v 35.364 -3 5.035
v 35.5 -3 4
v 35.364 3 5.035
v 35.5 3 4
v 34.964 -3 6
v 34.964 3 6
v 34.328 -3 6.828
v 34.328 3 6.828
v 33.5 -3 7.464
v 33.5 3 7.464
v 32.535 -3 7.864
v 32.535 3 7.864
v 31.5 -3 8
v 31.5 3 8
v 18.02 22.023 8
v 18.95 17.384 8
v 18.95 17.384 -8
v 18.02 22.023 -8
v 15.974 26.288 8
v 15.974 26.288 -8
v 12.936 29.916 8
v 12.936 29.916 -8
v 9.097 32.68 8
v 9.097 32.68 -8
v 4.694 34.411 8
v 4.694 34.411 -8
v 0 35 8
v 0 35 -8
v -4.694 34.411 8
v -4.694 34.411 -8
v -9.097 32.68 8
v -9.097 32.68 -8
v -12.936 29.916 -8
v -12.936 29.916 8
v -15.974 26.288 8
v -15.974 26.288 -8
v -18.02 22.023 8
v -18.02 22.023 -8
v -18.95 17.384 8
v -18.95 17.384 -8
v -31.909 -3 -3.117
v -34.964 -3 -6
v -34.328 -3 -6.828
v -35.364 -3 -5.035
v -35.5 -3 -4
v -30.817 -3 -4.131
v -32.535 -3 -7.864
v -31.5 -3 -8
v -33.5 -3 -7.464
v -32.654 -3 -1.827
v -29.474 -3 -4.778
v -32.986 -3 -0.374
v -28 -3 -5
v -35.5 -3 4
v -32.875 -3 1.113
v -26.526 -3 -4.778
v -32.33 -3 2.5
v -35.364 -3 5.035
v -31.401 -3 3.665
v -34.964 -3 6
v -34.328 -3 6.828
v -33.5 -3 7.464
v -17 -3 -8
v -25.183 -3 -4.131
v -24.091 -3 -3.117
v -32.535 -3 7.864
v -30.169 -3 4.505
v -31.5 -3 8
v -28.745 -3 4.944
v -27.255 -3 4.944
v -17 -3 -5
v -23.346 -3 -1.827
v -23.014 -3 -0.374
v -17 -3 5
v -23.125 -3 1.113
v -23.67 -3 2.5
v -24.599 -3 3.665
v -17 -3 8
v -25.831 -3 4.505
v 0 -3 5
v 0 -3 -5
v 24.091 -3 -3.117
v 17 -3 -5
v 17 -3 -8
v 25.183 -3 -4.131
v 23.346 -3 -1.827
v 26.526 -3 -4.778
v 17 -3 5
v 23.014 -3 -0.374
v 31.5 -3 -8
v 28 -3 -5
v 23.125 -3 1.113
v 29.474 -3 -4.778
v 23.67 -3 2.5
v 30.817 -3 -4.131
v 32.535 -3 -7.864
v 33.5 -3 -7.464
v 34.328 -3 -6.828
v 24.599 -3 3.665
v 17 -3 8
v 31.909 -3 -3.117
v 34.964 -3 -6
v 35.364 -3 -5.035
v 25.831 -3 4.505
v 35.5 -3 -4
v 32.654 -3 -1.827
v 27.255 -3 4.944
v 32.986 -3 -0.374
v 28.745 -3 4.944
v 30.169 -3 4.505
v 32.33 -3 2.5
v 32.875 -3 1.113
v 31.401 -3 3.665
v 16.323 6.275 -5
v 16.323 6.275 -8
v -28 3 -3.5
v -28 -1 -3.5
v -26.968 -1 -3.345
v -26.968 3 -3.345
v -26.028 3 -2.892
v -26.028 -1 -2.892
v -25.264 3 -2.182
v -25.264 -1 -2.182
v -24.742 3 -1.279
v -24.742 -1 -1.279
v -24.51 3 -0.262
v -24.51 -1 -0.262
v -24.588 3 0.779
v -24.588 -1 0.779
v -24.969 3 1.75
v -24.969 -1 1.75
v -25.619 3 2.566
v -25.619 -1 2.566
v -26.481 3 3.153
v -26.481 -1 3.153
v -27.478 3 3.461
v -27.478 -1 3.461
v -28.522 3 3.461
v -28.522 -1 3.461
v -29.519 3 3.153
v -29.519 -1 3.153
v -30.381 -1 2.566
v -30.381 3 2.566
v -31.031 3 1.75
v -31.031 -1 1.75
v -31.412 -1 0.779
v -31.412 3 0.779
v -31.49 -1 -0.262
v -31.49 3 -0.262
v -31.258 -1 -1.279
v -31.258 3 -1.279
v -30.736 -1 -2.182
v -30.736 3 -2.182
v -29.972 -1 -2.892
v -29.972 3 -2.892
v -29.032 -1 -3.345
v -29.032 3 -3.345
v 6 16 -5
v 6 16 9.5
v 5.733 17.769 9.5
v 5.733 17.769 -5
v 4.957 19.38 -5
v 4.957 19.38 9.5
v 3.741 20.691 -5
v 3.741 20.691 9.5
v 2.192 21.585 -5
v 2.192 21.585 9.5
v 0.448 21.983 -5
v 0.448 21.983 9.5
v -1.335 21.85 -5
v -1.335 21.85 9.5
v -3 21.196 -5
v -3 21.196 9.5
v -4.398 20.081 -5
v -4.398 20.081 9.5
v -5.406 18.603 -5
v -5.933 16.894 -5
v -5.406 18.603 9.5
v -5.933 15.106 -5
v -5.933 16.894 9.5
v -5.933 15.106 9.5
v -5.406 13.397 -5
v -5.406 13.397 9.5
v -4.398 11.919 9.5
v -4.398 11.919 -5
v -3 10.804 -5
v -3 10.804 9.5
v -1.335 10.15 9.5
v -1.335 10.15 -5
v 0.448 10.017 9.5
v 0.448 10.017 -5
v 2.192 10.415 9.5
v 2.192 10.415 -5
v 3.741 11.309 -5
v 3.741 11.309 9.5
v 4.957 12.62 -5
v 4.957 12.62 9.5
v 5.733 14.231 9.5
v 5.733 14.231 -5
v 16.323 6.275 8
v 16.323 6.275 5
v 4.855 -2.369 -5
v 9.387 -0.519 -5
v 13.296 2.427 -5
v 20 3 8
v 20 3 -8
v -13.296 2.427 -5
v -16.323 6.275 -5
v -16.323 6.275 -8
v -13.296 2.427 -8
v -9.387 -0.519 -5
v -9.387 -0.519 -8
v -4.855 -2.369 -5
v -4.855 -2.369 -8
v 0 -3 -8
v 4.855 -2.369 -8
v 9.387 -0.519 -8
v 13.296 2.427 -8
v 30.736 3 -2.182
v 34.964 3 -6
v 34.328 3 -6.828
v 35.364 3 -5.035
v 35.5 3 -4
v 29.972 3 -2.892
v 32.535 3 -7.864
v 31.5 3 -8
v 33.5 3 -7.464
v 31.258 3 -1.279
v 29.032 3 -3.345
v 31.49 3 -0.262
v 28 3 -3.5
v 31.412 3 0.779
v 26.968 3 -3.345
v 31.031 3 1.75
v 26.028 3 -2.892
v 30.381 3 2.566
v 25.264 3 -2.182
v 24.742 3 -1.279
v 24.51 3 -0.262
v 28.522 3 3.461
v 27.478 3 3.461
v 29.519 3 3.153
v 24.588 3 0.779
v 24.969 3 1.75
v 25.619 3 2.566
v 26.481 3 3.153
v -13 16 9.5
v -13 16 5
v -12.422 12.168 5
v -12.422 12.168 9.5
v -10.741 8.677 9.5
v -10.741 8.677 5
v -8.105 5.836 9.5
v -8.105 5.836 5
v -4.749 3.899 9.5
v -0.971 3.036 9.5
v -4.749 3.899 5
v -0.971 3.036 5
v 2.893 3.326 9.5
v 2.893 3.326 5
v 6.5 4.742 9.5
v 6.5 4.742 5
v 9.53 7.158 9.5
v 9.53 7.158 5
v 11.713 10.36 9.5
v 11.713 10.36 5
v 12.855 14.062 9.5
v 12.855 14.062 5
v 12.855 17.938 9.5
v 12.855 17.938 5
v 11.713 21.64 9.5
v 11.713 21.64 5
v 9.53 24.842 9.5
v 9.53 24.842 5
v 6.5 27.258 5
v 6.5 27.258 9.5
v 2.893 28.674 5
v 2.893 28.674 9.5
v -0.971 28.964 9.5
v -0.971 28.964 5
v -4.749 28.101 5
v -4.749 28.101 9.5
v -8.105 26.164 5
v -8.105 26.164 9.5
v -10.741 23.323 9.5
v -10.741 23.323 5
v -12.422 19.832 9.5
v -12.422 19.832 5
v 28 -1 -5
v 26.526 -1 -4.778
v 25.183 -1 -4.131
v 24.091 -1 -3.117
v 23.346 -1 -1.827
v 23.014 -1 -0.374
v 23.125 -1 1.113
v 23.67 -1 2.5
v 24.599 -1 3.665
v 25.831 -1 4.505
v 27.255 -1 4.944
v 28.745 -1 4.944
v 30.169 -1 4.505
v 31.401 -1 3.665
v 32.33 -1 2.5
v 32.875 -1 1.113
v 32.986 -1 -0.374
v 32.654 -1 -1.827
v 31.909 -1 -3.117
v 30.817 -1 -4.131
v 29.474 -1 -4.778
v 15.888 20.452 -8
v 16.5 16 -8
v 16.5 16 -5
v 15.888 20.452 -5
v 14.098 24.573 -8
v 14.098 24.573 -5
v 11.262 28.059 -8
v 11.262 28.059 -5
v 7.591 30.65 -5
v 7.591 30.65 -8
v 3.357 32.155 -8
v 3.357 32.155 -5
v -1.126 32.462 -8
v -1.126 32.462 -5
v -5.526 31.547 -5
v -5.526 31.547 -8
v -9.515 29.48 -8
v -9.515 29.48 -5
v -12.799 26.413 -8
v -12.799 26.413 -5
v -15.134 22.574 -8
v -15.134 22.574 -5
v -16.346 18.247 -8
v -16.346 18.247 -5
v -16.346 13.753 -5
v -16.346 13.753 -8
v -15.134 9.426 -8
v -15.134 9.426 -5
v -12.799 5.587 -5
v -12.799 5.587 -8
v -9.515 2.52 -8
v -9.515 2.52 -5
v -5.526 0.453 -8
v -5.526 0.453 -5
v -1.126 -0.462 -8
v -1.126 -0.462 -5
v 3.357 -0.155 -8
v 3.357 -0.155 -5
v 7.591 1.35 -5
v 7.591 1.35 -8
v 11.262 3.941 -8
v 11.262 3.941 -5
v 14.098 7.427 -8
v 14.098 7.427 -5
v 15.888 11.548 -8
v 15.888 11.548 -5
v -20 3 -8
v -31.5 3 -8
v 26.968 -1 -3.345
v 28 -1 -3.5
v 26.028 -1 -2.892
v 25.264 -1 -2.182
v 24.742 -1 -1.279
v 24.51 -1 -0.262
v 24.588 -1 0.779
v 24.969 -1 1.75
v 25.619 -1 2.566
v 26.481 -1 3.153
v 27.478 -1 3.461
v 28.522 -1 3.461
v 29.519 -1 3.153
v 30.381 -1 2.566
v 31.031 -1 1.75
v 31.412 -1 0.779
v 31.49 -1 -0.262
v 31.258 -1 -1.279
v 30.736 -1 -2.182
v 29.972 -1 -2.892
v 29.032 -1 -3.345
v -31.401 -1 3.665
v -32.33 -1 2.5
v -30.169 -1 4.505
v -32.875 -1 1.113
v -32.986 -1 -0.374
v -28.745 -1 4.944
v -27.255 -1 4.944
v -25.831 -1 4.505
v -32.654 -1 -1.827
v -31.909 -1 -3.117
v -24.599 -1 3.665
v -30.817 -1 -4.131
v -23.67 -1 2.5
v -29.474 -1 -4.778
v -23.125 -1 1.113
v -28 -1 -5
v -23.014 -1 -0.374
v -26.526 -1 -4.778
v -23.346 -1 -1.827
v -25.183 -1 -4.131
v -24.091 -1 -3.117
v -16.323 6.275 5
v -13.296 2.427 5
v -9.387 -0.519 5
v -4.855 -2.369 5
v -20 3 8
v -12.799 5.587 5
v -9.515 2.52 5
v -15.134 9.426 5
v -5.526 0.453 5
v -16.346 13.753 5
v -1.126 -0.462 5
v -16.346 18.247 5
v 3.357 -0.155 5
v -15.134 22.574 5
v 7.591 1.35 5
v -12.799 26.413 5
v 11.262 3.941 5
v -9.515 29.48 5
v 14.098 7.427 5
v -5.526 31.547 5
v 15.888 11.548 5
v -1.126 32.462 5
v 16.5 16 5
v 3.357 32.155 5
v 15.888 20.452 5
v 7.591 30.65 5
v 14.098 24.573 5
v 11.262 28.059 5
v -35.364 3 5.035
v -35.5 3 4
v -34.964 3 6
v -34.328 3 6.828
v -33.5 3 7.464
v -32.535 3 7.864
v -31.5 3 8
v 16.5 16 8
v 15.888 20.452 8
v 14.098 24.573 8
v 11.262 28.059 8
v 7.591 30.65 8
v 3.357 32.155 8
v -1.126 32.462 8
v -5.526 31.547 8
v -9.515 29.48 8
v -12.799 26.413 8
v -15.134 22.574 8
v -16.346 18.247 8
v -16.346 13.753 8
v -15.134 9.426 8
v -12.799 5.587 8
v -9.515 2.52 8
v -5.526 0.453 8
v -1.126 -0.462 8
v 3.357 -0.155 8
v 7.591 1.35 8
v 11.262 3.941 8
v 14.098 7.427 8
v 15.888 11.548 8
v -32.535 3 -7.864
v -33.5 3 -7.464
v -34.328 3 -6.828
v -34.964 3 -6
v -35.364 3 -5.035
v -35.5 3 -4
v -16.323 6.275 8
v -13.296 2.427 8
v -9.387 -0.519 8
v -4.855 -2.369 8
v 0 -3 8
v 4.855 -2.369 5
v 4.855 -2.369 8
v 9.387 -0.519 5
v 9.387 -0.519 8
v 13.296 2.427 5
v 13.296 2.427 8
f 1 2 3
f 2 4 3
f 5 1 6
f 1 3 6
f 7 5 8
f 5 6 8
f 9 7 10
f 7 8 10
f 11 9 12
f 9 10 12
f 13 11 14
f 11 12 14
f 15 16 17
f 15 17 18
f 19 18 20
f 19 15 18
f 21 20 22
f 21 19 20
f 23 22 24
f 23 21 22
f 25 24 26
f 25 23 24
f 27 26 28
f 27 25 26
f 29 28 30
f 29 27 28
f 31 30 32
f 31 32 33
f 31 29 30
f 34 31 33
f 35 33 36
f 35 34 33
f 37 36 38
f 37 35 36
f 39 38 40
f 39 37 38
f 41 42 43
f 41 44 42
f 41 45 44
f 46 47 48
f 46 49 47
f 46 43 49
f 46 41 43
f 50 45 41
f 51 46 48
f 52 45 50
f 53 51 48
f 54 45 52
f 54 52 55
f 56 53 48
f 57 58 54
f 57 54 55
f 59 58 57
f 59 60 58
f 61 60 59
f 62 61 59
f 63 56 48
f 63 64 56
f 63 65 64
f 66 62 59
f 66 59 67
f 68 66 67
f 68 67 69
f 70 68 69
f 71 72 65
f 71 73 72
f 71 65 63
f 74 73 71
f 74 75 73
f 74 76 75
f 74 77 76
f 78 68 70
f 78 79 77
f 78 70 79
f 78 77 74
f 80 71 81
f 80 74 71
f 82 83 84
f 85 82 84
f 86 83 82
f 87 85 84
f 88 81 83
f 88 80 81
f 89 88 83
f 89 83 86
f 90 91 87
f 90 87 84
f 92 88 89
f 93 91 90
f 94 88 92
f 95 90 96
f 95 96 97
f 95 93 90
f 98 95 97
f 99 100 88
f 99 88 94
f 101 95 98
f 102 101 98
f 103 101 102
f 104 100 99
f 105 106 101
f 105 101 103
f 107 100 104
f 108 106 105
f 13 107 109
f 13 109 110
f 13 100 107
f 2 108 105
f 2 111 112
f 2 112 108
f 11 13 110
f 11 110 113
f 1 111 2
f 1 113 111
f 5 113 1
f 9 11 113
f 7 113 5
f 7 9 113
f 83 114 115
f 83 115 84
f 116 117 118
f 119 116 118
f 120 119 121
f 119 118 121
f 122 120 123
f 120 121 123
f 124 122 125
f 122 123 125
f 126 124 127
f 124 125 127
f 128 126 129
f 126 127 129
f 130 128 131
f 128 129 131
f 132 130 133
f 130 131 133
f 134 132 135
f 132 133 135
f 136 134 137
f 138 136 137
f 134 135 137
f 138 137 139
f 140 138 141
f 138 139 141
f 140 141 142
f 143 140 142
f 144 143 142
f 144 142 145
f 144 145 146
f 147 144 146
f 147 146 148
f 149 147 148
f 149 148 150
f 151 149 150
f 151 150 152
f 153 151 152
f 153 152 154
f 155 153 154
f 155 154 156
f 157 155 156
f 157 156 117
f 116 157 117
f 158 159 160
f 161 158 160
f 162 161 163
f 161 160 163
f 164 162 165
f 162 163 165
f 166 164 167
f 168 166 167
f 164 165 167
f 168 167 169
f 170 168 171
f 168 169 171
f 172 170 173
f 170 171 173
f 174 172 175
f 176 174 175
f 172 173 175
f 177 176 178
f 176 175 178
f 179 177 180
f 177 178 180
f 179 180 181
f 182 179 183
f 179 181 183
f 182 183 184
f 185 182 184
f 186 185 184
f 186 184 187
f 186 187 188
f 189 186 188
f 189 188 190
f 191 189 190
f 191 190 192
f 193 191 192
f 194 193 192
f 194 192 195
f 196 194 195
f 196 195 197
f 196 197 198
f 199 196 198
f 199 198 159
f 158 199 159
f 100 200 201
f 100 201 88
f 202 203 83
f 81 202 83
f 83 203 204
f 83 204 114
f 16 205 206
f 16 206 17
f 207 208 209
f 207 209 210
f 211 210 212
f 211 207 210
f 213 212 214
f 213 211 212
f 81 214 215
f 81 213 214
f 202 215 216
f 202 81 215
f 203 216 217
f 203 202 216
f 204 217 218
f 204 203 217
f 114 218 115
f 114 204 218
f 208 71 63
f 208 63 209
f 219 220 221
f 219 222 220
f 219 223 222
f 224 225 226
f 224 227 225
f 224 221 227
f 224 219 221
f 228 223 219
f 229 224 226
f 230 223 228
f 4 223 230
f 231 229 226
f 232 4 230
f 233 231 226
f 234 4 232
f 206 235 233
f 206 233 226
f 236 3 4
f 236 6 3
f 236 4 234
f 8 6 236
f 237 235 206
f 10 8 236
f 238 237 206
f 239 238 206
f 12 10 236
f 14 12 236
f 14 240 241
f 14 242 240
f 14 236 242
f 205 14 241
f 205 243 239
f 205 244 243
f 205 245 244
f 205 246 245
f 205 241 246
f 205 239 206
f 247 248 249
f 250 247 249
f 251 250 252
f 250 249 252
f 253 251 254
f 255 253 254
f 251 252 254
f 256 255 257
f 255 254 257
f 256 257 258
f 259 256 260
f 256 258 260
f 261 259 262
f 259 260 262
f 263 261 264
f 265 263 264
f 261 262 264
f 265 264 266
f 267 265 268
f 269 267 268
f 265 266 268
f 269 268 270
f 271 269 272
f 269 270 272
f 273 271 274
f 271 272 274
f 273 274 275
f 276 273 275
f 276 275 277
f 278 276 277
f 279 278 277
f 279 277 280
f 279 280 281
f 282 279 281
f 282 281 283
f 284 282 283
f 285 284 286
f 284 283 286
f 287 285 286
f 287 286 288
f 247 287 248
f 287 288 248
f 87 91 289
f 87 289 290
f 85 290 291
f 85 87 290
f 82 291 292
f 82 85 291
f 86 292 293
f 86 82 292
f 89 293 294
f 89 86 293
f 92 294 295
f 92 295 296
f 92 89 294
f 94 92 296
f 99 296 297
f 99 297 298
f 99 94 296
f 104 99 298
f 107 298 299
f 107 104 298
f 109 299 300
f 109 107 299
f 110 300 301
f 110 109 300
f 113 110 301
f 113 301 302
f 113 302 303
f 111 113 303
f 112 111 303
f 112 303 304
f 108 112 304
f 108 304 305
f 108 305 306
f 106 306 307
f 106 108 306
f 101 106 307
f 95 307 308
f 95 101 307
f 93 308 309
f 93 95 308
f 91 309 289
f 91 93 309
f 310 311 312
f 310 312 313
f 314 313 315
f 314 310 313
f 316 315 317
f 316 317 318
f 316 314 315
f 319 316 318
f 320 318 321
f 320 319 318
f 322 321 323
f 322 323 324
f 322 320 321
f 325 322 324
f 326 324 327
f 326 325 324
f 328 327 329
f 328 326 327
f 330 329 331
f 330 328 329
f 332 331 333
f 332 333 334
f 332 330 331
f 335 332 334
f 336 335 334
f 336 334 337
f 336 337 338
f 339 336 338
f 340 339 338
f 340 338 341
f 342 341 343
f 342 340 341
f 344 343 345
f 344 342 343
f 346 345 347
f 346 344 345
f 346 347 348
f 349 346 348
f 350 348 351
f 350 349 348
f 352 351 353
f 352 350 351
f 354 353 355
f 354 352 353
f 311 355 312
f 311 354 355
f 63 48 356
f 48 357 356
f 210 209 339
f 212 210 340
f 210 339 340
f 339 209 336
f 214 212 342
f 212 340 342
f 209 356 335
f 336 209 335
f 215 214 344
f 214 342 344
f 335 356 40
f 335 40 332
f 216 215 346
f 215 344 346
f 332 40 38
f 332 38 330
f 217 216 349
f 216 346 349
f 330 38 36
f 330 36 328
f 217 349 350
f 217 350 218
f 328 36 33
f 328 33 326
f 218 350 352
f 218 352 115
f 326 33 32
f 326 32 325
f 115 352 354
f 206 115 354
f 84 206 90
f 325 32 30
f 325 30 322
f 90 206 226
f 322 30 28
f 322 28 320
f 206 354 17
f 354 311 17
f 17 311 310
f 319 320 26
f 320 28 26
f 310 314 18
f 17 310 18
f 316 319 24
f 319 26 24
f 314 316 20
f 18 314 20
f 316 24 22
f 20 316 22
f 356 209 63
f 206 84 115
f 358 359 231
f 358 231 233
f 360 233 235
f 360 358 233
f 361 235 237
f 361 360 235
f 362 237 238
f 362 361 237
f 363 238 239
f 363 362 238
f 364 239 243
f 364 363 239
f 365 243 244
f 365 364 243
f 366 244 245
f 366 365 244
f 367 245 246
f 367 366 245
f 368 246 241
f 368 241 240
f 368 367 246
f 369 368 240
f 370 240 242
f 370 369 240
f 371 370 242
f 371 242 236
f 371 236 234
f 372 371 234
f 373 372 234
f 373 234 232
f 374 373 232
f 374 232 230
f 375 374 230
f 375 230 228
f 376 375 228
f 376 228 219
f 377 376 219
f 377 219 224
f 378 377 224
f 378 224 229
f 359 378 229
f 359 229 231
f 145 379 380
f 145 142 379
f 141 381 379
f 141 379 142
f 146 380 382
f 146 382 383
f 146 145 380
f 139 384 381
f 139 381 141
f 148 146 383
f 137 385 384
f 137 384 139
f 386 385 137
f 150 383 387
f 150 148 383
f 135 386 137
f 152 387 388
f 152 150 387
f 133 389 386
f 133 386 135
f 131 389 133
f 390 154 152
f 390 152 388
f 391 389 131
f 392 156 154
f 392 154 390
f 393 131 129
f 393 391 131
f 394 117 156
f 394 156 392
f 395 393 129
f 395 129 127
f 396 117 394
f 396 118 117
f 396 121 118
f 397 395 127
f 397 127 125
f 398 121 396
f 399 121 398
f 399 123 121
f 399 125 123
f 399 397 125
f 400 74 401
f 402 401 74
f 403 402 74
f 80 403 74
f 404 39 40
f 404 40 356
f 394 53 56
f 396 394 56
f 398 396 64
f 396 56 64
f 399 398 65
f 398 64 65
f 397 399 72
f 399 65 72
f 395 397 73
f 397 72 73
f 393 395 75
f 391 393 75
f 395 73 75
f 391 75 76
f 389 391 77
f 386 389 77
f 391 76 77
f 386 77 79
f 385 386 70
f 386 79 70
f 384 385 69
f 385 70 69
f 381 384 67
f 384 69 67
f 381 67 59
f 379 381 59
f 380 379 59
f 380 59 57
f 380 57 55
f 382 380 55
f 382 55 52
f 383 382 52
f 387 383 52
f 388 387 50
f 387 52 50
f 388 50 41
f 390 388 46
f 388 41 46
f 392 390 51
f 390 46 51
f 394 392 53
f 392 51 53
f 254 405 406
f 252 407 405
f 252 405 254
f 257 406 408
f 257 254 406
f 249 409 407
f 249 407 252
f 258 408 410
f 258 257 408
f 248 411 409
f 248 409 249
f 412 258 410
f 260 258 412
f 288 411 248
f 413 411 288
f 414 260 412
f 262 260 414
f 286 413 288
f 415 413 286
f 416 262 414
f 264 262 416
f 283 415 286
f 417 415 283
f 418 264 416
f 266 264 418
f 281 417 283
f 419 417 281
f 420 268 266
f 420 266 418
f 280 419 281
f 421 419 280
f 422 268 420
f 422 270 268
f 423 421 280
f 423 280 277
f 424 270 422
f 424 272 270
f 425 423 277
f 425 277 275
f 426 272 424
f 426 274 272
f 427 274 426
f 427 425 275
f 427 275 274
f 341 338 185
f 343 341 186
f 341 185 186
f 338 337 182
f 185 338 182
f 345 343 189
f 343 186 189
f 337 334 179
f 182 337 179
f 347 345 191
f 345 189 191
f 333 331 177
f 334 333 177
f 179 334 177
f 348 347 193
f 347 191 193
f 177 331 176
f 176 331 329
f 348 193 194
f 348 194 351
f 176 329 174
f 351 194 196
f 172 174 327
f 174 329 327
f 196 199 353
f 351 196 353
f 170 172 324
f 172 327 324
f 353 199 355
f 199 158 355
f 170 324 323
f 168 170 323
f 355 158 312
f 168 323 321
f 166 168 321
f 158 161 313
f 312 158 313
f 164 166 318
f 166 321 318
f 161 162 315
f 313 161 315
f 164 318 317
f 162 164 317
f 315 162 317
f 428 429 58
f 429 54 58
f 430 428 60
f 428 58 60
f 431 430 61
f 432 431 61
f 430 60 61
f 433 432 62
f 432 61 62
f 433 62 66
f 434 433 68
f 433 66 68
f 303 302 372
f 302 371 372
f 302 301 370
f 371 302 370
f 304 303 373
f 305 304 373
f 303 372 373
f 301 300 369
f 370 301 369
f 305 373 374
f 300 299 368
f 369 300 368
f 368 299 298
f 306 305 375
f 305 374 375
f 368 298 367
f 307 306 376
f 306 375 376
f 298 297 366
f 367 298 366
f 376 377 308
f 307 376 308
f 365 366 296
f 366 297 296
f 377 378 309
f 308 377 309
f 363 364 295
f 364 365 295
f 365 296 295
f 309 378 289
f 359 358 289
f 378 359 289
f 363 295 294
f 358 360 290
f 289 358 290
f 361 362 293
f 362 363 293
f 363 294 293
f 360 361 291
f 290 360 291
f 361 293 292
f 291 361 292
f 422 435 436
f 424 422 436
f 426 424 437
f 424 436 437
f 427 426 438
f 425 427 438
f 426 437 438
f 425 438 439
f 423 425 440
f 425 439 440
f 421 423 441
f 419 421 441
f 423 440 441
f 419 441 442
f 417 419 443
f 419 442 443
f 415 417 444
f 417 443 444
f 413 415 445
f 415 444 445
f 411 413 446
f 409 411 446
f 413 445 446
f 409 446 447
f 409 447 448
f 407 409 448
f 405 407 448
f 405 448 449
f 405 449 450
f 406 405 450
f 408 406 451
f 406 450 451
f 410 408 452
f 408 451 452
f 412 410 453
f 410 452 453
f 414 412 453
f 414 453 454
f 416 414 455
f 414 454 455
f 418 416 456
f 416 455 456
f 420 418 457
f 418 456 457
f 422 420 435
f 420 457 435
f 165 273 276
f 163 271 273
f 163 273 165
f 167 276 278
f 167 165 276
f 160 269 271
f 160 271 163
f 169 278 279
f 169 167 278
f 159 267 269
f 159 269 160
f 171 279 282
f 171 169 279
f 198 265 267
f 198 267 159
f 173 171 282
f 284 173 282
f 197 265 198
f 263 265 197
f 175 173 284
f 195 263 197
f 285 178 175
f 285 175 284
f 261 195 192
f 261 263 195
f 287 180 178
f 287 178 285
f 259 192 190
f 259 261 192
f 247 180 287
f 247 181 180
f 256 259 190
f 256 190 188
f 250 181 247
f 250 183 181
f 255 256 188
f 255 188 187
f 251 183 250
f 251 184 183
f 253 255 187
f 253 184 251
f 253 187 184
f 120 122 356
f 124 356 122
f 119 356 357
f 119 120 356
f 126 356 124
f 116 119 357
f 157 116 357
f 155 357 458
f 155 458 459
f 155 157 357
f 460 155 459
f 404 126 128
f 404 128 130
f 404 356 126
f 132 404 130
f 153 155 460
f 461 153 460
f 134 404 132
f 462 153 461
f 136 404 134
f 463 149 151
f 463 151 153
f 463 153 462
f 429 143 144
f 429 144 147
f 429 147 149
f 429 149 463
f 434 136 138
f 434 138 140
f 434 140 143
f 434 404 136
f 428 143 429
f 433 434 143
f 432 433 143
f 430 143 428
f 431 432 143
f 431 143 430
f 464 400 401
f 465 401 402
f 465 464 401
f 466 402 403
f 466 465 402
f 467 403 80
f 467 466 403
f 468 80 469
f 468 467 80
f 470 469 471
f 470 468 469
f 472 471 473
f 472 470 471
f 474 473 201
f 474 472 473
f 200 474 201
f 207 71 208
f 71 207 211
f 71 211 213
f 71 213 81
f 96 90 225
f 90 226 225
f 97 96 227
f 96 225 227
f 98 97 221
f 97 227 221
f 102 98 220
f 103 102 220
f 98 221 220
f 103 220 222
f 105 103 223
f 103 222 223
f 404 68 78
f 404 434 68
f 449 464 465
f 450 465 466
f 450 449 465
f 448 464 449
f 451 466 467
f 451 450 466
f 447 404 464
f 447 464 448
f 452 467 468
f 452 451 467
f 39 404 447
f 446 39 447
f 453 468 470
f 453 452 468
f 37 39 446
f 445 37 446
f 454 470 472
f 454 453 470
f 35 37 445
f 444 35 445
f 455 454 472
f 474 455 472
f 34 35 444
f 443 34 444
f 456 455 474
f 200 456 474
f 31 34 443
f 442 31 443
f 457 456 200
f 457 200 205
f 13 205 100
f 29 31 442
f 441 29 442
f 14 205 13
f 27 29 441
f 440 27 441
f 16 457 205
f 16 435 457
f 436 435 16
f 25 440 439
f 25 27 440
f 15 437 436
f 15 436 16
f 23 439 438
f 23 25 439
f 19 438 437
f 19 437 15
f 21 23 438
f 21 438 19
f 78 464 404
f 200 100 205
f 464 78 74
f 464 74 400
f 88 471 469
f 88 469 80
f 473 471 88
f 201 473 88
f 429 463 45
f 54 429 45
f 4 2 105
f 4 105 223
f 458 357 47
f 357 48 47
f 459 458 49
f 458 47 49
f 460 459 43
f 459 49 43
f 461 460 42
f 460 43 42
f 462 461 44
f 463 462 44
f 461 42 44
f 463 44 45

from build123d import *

# Parameters (mm, degrees)
EXTRUDE_1_DEPTH     = 8
EXTRUDE_2_DEPTH     = 5
SKETCH_4_R          = 16.5
CUT_EXTRUDE_1_DEPTH = 3
SKETCH_5_R          = 13
EXTRUDE_3_DEPTH     = 4.5
SKETCH_6_R          = 6
CUT_EXTRUDE_3_DEPTH = 53.834647723
FILLET_1_R          = 4
SKETCH_7_R          = 5
CUT_EXTRUDE_4_DEPTH = 2
CUT_EXTRUDE_5_REACH = 53.444
SKETCH_8_R          = 3.5


with BuildPart() as part:
    # 草图1 → 凸台-拉伸1 (new, symmetric)
    with BuildSketch(Plane.XY):
        with BuildLine():
            ThreePointArc((-16.322626067, 6.275192635), (0, -3), (16.322626067, 6.275192635))
            Line((16.322626067, 6.275192635), (17, -3))
            Line((17, -3), (35.5, -3))
            Line((35.5, -3), (35.5, 3))
            Line((35.5, 3), (20, 3))
            Line((20, 3), (18.949533673, 17.383897959))
            ThreePointArc((18.949533673, 17.383897959), (0, 35), (-18.949533673, 17.383897959))
            Line((-18.949533673, 17.383897959), (-20, 3))
            Line((-20, 3), (-35.5, 3))
            Line((-35.5, 3), (-35.5, -3))
            Line((-35.5, -3), (-17, -3))
            Line((-17, -3), (-16.322626067, 6.275192635))
        make_face()
    extrude(amount=EXTRUDE_1_DEPTH, both=True)

    # 草图3 → 凸台-拉伸2 (add, symmetric)
    with BuildSketch(Plane.XY):
        with BuildLine():
            Line((-16.322626067, 6.275192635), (-17, -3))
            Line((-17, -3), (-6e-08, -3))
            ThreePointArc((-6e-08, -3), (-9.386923379, -0.519251481), (-16.322626067, 6.275192635))
        make_face()
        with BuildLine():
            ThreePointArc((16.322626067, 6.275192635), (9.386923327, -0.51925151), (-6e-08, -3))
            Line((-6e-08, -3), (17, -3))
            Line((17, -3), (16.322626067, 6.275192635))
        make_face()
    extrude(amount=EXTRUDE_2_DEPTH, both=True)

    # 草图4 → 切除-拉伸1 (cut)
    with BuildSketch(Plane.XY.offset(8)):
        with Locations((0, 16)):
            Circle(SKETCH_4_R)
    cut_extrude_1 = extrude(amount=-CUT_EXTRUDE_1_DEPTH, mode=Mode.SUBTRACT)

    # 镜向1: 切除-拉伸1 across plane
    add(cut_extrude_1.mirror(Plane.XY), mode=Mode.SUBTRACT)

    # 草图5 → 凸台-拉伸3 (add)
    with BuildSketch(Plane.XY.offset(5)):
        with Locations(Location((0, 16, 0), (0, 0, 180))):
            Circle(SKETCH_5_R)
    extrude(amount=EXTRUDE_3_DEPTH)

    # 草图6 → 切除-拉伸3 (cut, through all)
    with BuildSketch(Plane.XY.offset(9.5)):
        with Locations((0, 16)):
            Circle(SKETCH_6_R)
    extrude(amount=-CUT_EXTRUDE_3_DEPTH, mode=Mode.SUBTRACT)

    # 圆角1
    fillet_1_edges = [part.edges().sort_by_distance(p)[0] for p in [
        (-35.5, 0, -8),
        (35.5, 0, -8),
        (35.5, 0, 8),
        (-35.5, 0, 8),
    ]]
    fillet(fillet_1_edges, radius=FILLET_1_R)

    # 草图7 → 切除-拉伸4 (cut)
    with BuildSketch(Plane.XZ.offset(3)):
        with Locations(Location((-28, 0, 0), (0, 0, 270))):
            Circle(SKETCH_7_R)
    cut_extrude_4 = extrude(amount=-CUT_EXTRUDE_4_DEPTH, mode=Mode.SUBTRACT)

    # 草图8 → 切除-拉伸5 (cut, up to next)
    with BuildSketch(Plane.XZ.offset(1), mode=Mode.PRIVATE) as cut_extrude_5_sk1:
        with Locations(Location((-28, 0, 0), (0, 0, 270))):
            Circle(SKETCH_8_R)
    cut_extrude_5_tool1 = extrude(cut_extrude_5_sk1.sketch, amount=-CUT_EXTRUDE_5_REACH, mode=Mode.PRIVATE) & part.part
    cut_extrude_5 = cut_extrude_5_tool1.solids().sort_by_distance((-28, -1, 0))[0]
    add(cut_extrude_5, mode=Mode.SUBTRACT)

    # 镜向2: 切除-拉伸4, 切除-拉伸5 across plane
    add(cut_extrude_4.mirror(Plane(origin=(0, 0, 0), x_dir=(0, 0, 1), z_dir=(1, 0, 0))), mode=Mode.SUBTRACT)
    add(cut_extrude_5.mirror(Plane(origin=(0, 0, 0), x_dir=(0, 0, 1), z_dir=(1, 0, 0))), mode=Mode.SUBTRACT)


solid = part.part
